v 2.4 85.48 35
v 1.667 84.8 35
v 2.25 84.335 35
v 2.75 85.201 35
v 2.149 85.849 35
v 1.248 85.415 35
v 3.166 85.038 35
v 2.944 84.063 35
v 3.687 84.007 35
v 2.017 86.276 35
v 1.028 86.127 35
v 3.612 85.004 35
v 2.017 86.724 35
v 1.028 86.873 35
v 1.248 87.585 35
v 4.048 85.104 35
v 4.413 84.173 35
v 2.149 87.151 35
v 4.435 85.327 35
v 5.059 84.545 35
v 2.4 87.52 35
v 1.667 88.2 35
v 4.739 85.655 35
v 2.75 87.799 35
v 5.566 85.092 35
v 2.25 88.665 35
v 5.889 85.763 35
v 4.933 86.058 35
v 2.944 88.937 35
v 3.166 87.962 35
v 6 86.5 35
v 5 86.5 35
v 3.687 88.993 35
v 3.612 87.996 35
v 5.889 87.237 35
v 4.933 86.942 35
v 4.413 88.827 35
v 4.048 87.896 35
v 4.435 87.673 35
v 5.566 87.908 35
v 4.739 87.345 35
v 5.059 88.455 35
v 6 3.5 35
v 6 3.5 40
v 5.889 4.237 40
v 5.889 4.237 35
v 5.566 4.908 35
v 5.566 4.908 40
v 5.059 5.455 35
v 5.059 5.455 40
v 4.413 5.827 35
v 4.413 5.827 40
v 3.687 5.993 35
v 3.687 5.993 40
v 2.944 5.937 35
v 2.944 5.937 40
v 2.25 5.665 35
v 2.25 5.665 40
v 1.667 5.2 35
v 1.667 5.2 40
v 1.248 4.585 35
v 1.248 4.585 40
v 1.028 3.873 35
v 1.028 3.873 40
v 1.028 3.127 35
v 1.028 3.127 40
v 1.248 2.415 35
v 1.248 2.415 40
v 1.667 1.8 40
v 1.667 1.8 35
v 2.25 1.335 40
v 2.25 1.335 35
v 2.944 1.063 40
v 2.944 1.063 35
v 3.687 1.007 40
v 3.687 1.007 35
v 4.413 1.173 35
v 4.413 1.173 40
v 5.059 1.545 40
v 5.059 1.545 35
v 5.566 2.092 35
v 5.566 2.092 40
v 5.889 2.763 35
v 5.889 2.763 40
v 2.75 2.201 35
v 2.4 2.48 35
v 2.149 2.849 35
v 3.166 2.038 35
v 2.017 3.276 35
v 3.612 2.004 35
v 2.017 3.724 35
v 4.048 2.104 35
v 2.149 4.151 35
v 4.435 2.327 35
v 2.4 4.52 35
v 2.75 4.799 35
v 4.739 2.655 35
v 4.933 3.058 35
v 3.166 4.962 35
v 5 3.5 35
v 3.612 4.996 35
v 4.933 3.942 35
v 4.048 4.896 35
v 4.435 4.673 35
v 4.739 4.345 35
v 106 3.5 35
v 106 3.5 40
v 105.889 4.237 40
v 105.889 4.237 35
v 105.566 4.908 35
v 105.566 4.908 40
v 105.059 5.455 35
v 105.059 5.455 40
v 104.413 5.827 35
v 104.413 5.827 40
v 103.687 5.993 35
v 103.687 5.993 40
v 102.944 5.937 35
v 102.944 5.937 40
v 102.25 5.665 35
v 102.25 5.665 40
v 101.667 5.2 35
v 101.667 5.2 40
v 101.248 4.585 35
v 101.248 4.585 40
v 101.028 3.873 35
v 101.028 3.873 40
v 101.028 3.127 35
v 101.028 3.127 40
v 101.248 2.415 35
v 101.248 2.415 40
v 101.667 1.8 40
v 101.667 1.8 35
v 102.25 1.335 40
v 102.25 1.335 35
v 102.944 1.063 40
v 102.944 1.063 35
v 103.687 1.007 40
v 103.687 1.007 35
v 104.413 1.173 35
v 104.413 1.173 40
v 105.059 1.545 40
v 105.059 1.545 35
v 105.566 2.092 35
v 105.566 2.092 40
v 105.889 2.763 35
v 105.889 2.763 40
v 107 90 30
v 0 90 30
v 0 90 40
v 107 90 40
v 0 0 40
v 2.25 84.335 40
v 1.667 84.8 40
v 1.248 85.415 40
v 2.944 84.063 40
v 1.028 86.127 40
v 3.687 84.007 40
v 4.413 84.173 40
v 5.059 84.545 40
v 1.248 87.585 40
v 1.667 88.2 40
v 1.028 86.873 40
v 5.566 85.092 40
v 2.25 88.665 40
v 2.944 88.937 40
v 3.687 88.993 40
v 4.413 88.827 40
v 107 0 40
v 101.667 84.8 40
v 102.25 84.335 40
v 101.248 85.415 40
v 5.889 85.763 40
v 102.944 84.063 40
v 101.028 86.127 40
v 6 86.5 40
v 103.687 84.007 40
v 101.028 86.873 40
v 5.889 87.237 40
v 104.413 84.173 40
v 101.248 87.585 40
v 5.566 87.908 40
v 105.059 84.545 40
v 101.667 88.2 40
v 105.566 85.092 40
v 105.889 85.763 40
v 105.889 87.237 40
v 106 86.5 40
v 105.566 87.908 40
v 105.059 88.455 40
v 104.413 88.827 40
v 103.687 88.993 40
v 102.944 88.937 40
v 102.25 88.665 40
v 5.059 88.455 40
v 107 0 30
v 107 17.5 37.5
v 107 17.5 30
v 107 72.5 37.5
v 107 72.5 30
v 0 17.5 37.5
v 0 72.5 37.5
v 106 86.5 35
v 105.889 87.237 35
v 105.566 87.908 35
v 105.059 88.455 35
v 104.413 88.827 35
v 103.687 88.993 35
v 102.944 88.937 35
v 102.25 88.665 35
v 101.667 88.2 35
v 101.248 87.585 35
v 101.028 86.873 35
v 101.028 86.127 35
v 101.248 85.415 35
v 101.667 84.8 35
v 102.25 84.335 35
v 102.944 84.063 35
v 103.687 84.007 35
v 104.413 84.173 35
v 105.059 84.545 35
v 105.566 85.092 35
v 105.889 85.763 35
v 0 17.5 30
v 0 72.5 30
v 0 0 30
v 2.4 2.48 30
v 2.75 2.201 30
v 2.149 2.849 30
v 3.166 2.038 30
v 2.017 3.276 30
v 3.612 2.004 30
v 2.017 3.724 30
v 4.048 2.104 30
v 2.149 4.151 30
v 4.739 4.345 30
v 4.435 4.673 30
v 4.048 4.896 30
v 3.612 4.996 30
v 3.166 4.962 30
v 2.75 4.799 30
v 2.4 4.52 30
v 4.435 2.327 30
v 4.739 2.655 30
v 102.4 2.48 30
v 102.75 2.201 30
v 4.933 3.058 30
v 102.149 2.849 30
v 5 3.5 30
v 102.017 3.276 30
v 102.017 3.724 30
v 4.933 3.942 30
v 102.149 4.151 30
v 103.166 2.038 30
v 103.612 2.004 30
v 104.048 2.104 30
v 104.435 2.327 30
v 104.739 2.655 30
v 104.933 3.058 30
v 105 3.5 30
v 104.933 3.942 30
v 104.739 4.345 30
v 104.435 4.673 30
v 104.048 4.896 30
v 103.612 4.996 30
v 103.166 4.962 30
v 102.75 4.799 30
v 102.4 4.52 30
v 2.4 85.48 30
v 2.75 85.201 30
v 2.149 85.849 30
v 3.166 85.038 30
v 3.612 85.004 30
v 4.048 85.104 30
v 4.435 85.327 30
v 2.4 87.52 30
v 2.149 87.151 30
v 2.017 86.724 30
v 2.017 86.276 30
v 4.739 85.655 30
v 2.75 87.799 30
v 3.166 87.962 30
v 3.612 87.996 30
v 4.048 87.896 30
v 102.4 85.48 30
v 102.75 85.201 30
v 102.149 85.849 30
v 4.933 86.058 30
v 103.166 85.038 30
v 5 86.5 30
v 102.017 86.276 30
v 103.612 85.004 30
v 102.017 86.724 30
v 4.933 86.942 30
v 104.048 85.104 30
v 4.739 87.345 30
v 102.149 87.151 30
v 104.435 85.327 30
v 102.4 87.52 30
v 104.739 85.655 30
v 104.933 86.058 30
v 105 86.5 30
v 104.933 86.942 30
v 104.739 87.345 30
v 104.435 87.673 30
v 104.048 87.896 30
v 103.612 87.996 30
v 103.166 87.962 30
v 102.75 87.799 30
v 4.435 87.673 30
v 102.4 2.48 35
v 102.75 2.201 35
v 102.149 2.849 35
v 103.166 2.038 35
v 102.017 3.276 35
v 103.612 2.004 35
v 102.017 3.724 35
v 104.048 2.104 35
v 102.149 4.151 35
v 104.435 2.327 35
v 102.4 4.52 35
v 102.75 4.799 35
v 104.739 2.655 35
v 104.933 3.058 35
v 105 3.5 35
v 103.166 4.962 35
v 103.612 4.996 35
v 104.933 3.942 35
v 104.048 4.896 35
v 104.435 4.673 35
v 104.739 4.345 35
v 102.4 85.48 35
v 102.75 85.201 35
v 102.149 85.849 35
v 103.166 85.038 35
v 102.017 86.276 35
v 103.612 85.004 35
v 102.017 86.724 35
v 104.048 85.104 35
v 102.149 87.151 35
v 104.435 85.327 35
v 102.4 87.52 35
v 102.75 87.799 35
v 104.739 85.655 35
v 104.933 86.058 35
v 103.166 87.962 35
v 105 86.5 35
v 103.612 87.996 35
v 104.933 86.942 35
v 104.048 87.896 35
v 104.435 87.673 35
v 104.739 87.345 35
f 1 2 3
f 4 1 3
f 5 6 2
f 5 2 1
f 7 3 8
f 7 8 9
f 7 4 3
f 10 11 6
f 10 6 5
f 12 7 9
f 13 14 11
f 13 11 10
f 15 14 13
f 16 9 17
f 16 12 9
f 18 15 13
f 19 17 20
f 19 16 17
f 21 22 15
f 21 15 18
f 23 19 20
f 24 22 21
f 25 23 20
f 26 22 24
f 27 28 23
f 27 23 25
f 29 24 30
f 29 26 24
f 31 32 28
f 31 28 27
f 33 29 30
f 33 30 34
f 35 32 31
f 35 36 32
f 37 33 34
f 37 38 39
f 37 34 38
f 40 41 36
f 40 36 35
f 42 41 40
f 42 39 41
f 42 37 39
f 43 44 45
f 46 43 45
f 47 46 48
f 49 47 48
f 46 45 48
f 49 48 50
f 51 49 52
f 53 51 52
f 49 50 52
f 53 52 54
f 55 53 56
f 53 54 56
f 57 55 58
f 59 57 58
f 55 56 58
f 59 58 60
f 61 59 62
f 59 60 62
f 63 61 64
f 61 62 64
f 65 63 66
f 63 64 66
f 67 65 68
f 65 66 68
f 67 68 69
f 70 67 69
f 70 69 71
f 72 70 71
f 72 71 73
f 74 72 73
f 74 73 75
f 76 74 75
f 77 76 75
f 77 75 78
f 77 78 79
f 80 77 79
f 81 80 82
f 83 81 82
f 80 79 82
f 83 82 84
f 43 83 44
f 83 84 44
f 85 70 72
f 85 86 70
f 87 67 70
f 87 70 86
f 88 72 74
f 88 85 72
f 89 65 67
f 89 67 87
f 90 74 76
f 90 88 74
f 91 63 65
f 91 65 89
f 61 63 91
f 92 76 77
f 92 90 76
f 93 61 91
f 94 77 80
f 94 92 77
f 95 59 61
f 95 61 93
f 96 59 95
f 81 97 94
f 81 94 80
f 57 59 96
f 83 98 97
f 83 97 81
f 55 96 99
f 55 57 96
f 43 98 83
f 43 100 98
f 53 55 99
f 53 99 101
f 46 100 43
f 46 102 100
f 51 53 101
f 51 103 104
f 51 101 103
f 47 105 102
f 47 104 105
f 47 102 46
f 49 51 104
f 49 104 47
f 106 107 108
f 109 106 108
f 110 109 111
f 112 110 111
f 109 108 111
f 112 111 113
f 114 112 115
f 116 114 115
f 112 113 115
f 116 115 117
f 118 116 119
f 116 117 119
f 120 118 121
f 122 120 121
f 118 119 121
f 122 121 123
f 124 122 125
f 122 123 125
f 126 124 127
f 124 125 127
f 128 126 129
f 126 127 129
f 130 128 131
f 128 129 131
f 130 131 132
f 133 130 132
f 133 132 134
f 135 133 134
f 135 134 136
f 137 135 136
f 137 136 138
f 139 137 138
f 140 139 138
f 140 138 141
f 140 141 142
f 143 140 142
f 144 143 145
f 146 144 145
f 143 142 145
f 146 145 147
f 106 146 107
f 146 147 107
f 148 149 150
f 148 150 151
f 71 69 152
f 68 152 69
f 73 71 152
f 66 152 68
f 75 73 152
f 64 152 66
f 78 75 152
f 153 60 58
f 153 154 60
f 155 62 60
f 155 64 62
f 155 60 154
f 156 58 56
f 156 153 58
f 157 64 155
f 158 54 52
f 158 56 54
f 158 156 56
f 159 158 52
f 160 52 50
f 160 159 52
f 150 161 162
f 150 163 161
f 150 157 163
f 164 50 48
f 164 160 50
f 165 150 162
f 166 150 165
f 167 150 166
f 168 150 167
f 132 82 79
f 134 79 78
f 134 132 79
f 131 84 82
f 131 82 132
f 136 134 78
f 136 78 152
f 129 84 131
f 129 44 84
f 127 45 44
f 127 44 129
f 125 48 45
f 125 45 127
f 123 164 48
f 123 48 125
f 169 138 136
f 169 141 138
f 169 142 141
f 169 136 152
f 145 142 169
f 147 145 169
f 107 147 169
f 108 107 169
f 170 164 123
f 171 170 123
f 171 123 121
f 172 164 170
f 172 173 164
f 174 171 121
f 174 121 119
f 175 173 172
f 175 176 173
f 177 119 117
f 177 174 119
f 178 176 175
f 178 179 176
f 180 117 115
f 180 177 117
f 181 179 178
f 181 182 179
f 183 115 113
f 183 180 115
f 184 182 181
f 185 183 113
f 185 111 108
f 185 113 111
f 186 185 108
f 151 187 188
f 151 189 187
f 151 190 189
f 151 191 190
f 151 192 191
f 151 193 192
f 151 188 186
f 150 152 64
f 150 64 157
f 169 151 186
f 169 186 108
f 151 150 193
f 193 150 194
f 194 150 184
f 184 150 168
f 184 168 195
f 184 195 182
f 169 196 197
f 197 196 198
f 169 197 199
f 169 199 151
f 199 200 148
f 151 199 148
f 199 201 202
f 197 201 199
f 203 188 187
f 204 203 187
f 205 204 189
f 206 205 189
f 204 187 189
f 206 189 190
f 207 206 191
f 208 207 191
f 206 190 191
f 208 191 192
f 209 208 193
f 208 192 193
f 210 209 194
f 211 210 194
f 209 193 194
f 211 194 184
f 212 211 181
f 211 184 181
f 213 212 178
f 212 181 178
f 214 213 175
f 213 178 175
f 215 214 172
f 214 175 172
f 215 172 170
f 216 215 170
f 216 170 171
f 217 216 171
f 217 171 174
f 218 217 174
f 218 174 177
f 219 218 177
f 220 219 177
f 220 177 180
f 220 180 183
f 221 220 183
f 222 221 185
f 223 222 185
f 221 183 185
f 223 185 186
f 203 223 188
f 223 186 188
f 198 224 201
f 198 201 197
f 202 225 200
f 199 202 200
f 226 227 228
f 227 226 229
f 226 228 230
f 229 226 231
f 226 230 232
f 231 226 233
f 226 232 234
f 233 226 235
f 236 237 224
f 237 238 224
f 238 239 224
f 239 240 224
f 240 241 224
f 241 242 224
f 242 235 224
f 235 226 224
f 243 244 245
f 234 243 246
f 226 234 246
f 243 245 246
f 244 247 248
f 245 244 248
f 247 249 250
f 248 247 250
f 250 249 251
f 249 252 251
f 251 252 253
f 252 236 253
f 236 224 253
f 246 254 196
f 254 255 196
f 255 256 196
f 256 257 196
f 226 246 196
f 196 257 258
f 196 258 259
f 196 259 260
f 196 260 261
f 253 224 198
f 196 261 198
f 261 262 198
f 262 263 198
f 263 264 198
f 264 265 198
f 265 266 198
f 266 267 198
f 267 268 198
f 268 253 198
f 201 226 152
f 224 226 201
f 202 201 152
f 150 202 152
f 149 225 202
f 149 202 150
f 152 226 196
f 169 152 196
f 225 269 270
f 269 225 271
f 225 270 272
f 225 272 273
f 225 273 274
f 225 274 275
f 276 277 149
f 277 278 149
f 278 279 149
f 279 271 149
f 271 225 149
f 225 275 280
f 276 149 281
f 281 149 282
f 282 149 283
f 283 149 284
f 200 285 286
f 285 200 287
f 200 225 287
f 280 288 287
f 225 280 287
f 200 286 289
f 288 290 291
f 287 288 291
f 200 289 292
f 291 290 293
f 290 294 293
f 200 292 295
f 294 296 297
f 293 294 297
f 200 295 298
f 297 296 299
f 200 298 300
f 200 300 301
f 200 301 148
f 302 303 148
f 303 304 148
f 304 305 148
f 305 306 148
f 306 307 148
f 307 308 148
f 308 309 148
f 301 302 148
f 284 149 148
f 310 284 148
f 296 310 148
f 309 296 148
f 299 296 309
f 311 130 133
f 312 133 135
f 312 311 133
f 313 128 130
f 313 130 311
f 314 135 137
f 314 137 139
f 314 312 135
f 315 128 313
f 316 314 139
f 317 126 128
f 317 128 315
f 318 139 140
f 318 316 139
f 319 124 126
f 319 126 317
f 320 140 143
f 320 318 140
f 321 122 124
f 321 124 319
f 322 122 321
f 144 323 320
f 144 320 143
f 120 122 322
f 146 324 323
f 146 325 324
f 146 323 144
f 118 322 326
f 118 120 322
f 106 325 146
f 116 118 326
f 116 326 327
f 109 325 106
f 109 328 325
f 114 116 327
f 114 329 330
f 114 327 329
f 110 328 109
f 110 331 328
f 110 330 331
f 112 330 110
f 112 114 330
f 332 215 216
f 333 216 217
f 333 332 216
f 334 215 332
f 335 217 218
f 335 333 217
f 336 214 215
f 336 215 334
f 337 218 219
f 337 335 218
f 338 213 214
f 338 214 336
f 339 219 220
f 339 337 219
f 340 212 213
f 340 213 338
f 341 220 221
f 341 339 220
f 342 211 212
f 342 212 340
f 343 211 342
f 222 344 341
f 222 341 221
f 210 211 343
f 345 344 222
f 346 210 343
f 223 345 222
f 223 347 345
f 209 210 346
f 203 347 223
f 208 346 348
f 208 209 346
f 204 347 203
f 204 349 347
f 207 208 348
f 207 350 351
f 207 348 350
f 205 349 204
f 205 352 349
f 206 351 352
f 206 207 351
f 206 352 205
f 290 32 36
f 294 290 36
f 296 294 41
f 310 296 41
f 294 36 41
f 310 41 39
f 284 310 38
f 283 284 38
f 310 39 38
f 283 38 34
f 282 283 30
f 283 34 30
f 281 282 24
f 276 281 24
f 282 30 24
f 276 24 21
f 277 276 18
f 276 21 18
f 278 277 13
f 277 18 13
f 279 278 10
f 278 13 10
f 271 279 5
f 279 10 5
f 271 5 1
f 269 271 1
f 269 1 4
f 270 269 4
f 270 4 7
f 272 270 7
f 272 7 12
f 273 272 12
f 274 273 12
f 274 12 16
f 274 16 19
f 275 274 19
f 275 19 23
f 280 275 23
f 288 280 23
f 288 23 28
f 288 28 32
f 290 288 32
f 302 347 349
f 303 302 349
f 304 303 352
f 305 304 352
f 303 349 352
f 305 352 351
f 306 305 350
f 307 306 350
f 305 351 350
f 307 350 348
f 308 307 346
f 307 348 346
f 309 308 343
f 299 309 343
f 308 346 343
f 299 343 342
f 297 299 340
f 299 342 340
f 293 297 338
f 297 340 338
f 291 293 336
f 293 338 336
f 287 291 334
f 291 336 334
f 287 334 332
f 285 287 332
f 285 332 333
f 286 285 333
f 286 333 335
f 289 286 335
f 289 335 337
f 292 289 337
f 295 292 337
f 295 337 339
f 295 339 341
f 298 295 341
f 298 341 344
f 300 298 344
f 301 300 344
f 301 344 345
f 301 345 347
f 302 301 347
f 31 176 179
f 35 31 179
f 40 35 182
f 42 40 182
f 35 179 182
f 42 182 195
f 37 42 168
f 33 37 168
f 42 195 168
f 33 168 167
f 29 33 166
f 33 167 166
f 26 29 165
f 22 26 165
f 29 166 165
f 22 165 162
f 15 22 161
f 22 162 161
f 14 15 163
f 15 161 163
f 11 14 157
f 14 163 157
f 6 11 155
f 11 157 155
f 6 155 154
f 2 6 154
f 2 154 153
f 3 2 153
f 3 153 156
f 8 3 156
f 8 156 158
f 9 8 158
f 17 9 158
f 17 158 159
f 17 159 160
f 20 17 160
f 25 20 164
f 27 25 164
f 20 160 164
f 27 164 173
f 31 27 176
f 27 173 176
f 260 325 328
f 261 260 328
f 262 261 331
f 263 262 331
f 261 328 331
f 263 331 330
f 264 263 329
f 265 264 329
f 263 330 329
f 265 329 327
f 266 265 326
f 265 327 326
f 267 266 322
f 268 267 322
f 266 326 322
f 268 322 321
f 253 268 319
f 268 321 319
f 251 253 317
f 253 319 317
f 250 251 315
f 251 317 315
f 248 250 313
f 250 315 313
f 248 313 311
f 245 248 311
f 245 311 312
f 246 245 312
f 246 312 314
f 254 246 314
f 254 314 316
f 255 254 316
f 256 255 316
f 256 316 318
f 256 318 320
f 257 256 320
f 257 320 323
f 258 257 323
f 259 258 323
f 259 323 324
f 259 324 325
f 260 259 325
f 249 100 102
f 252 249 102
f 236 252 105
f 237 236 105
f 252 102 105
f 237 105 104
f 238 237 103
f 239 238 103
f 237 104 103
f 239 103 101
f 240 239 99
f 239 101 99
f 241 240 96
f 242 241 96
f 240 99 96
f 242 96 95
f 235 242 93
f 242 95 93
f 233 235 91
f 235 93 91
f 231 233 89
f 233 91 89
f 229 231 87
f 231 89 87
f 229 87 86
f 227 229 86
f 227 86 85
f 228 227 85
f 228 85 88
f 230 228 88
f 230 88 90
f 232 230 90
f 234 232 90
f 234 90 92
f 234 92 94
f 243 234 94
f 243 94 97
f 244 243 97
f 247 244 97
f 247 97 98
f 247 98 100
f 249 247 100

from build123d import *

# Parameters (mm, degrees)
SKETCH005_W                        = 107
SKETCH005_H                        = 90
PAD003_DEPTH                       = 10
SKETCH008_R                        = 2.5
POCKET004_DEPTH                    = 5
SKETCH009_R                        = 1.5
POCKET005_DEPTH                    = 285.350782
SKETCH008_LINEARPATTERN_2_R        = 2.5
POCKET004_LINEARPATTERN_2_DEPTH    = 5
LINEARPATTERN001_COUNT             = 2
LINEARPATTERN001_PITCH             = 83
SKETCH009_LINEARPATTERN002_2_R     = 1.5
POCKET005_LINEARPATTERN002_2_DEPTH = 285.350782
LINEARPATTERN003_COUNT             = 2
LINEARPATTERN003_PITCH             = 83
SKETCH012_W                        = 110
SKETCH012_H                        = 55
POCKET008_DEPTH                    = 7.5


with BuildPart() as part:
    # Sketch005 → Pad003 (new body)
    with BuildSketch(Plane.XY):
        with Locations((53.5, 45)):
            Rectangle(SKETCH005_W, SKETCH005_H)
    extrude(amount=PAD003_DEPTH)

    # Sketch008 (on Face6 of Pad003) → Pocket004 (cut)
    with BuildSketch(Plane.XY.offset(10)):
        with Locations((3.5, 86.5)):
            Circle(SKETCH008_R)
    pocket004 = extrude(amount=-POCKET004_DEPTH, mode=Mode.SUBTRACT)

    # Sketch009 (on Face8 of Pocket004) → Pocket005 (cut, through all)
    with BuildSketch(Plane.XY.offset(5)):
        with Locations((3.5, 86.5)):
            Circle(SKETCH009_R)
    pocket005 = extrude(amount=-POCKET005_DEPTH, mode=Mode.SUBTRACT)

    # Sketch008 LinearPattern 2 → Pocket004 LinearPattern 2 (cut)
    with BuildSketch(Plane(origin=(100, 0, 10), x_dir=(1, 0, 0), z_dir=(0, 0, 1))):
        with Locations((3.5, 86.5)):
            Circle(SKETCH008_LINEARPATTERN_2_R)
    pocket004_linearpattern_2 = extrude(amount=-POCKET004_LINEARPATTERN_2_DEPTH, mode=Mode.SUBTRACT)

    # LinearPattern001: Pocket004, Pocket004 LinearPattern 2 ×2
    with Locations(*[(0, -i * LINEARPATTERN001_PITCH, 0) for i in range(1, LINEARPATTERN001_COUNT)]):
        add(pocket004, mode=Mode.SUBTRACT)
        add(pocket004_linearpattern_2, mode=Mode.SUBTRACT)

    # Sketch009 LinearPattern002 2 → Pocket005 LinearPattern002 2 (cut, through all)
    with BuildSketch(Plane(origin=(100, 0, 5), x_dir=(1, 0, 0), z_dir=(0, 0, 1))):
        with Locations((3.5, 86.5)):
            Circle(SKETCH009_LINEARPATTERN002_2_R)
    pocket005_linearpattern002_2 = extrude(amount=-POCKET005_LINEARPATTERN002_2_DEPTH, mode=Mode.SUBTRACT)

    # LinearPattern003: Pocket005, Pocket005 LinearPattern002 2 ×2
    with Locations(*[(0, -i * LINEARPATTERN003_PITCH, 0) for i in range(1, LINEARPATTERN003_COUNT)]):
        add(pocket005, mode=Mode.SUBTRACT)
        add(pocket005_linearpattern002_2, mode=Mode.SUBTRACT)

    # Sketch012 (on Face4 of MultiTransform001) → Pocket008 (cut)
    with BuildSketch(Plane(origin=(0, 0, 0), x_dir=(1, 0, 0), z_dir=(0, 0, -1))):
        with Locations((53.5, -45)):
            Rectangle(SKETCH012_W, SKETCH012_H)
    extrude(amount=-POCKET008_DEPTH, mode=Mode.SUBTRACT)


with BuildPart() as part_1:
    # Body001 placement: moved
    add(part.part.moved(Location((0, 0, 30))))


solid = part_1.part
